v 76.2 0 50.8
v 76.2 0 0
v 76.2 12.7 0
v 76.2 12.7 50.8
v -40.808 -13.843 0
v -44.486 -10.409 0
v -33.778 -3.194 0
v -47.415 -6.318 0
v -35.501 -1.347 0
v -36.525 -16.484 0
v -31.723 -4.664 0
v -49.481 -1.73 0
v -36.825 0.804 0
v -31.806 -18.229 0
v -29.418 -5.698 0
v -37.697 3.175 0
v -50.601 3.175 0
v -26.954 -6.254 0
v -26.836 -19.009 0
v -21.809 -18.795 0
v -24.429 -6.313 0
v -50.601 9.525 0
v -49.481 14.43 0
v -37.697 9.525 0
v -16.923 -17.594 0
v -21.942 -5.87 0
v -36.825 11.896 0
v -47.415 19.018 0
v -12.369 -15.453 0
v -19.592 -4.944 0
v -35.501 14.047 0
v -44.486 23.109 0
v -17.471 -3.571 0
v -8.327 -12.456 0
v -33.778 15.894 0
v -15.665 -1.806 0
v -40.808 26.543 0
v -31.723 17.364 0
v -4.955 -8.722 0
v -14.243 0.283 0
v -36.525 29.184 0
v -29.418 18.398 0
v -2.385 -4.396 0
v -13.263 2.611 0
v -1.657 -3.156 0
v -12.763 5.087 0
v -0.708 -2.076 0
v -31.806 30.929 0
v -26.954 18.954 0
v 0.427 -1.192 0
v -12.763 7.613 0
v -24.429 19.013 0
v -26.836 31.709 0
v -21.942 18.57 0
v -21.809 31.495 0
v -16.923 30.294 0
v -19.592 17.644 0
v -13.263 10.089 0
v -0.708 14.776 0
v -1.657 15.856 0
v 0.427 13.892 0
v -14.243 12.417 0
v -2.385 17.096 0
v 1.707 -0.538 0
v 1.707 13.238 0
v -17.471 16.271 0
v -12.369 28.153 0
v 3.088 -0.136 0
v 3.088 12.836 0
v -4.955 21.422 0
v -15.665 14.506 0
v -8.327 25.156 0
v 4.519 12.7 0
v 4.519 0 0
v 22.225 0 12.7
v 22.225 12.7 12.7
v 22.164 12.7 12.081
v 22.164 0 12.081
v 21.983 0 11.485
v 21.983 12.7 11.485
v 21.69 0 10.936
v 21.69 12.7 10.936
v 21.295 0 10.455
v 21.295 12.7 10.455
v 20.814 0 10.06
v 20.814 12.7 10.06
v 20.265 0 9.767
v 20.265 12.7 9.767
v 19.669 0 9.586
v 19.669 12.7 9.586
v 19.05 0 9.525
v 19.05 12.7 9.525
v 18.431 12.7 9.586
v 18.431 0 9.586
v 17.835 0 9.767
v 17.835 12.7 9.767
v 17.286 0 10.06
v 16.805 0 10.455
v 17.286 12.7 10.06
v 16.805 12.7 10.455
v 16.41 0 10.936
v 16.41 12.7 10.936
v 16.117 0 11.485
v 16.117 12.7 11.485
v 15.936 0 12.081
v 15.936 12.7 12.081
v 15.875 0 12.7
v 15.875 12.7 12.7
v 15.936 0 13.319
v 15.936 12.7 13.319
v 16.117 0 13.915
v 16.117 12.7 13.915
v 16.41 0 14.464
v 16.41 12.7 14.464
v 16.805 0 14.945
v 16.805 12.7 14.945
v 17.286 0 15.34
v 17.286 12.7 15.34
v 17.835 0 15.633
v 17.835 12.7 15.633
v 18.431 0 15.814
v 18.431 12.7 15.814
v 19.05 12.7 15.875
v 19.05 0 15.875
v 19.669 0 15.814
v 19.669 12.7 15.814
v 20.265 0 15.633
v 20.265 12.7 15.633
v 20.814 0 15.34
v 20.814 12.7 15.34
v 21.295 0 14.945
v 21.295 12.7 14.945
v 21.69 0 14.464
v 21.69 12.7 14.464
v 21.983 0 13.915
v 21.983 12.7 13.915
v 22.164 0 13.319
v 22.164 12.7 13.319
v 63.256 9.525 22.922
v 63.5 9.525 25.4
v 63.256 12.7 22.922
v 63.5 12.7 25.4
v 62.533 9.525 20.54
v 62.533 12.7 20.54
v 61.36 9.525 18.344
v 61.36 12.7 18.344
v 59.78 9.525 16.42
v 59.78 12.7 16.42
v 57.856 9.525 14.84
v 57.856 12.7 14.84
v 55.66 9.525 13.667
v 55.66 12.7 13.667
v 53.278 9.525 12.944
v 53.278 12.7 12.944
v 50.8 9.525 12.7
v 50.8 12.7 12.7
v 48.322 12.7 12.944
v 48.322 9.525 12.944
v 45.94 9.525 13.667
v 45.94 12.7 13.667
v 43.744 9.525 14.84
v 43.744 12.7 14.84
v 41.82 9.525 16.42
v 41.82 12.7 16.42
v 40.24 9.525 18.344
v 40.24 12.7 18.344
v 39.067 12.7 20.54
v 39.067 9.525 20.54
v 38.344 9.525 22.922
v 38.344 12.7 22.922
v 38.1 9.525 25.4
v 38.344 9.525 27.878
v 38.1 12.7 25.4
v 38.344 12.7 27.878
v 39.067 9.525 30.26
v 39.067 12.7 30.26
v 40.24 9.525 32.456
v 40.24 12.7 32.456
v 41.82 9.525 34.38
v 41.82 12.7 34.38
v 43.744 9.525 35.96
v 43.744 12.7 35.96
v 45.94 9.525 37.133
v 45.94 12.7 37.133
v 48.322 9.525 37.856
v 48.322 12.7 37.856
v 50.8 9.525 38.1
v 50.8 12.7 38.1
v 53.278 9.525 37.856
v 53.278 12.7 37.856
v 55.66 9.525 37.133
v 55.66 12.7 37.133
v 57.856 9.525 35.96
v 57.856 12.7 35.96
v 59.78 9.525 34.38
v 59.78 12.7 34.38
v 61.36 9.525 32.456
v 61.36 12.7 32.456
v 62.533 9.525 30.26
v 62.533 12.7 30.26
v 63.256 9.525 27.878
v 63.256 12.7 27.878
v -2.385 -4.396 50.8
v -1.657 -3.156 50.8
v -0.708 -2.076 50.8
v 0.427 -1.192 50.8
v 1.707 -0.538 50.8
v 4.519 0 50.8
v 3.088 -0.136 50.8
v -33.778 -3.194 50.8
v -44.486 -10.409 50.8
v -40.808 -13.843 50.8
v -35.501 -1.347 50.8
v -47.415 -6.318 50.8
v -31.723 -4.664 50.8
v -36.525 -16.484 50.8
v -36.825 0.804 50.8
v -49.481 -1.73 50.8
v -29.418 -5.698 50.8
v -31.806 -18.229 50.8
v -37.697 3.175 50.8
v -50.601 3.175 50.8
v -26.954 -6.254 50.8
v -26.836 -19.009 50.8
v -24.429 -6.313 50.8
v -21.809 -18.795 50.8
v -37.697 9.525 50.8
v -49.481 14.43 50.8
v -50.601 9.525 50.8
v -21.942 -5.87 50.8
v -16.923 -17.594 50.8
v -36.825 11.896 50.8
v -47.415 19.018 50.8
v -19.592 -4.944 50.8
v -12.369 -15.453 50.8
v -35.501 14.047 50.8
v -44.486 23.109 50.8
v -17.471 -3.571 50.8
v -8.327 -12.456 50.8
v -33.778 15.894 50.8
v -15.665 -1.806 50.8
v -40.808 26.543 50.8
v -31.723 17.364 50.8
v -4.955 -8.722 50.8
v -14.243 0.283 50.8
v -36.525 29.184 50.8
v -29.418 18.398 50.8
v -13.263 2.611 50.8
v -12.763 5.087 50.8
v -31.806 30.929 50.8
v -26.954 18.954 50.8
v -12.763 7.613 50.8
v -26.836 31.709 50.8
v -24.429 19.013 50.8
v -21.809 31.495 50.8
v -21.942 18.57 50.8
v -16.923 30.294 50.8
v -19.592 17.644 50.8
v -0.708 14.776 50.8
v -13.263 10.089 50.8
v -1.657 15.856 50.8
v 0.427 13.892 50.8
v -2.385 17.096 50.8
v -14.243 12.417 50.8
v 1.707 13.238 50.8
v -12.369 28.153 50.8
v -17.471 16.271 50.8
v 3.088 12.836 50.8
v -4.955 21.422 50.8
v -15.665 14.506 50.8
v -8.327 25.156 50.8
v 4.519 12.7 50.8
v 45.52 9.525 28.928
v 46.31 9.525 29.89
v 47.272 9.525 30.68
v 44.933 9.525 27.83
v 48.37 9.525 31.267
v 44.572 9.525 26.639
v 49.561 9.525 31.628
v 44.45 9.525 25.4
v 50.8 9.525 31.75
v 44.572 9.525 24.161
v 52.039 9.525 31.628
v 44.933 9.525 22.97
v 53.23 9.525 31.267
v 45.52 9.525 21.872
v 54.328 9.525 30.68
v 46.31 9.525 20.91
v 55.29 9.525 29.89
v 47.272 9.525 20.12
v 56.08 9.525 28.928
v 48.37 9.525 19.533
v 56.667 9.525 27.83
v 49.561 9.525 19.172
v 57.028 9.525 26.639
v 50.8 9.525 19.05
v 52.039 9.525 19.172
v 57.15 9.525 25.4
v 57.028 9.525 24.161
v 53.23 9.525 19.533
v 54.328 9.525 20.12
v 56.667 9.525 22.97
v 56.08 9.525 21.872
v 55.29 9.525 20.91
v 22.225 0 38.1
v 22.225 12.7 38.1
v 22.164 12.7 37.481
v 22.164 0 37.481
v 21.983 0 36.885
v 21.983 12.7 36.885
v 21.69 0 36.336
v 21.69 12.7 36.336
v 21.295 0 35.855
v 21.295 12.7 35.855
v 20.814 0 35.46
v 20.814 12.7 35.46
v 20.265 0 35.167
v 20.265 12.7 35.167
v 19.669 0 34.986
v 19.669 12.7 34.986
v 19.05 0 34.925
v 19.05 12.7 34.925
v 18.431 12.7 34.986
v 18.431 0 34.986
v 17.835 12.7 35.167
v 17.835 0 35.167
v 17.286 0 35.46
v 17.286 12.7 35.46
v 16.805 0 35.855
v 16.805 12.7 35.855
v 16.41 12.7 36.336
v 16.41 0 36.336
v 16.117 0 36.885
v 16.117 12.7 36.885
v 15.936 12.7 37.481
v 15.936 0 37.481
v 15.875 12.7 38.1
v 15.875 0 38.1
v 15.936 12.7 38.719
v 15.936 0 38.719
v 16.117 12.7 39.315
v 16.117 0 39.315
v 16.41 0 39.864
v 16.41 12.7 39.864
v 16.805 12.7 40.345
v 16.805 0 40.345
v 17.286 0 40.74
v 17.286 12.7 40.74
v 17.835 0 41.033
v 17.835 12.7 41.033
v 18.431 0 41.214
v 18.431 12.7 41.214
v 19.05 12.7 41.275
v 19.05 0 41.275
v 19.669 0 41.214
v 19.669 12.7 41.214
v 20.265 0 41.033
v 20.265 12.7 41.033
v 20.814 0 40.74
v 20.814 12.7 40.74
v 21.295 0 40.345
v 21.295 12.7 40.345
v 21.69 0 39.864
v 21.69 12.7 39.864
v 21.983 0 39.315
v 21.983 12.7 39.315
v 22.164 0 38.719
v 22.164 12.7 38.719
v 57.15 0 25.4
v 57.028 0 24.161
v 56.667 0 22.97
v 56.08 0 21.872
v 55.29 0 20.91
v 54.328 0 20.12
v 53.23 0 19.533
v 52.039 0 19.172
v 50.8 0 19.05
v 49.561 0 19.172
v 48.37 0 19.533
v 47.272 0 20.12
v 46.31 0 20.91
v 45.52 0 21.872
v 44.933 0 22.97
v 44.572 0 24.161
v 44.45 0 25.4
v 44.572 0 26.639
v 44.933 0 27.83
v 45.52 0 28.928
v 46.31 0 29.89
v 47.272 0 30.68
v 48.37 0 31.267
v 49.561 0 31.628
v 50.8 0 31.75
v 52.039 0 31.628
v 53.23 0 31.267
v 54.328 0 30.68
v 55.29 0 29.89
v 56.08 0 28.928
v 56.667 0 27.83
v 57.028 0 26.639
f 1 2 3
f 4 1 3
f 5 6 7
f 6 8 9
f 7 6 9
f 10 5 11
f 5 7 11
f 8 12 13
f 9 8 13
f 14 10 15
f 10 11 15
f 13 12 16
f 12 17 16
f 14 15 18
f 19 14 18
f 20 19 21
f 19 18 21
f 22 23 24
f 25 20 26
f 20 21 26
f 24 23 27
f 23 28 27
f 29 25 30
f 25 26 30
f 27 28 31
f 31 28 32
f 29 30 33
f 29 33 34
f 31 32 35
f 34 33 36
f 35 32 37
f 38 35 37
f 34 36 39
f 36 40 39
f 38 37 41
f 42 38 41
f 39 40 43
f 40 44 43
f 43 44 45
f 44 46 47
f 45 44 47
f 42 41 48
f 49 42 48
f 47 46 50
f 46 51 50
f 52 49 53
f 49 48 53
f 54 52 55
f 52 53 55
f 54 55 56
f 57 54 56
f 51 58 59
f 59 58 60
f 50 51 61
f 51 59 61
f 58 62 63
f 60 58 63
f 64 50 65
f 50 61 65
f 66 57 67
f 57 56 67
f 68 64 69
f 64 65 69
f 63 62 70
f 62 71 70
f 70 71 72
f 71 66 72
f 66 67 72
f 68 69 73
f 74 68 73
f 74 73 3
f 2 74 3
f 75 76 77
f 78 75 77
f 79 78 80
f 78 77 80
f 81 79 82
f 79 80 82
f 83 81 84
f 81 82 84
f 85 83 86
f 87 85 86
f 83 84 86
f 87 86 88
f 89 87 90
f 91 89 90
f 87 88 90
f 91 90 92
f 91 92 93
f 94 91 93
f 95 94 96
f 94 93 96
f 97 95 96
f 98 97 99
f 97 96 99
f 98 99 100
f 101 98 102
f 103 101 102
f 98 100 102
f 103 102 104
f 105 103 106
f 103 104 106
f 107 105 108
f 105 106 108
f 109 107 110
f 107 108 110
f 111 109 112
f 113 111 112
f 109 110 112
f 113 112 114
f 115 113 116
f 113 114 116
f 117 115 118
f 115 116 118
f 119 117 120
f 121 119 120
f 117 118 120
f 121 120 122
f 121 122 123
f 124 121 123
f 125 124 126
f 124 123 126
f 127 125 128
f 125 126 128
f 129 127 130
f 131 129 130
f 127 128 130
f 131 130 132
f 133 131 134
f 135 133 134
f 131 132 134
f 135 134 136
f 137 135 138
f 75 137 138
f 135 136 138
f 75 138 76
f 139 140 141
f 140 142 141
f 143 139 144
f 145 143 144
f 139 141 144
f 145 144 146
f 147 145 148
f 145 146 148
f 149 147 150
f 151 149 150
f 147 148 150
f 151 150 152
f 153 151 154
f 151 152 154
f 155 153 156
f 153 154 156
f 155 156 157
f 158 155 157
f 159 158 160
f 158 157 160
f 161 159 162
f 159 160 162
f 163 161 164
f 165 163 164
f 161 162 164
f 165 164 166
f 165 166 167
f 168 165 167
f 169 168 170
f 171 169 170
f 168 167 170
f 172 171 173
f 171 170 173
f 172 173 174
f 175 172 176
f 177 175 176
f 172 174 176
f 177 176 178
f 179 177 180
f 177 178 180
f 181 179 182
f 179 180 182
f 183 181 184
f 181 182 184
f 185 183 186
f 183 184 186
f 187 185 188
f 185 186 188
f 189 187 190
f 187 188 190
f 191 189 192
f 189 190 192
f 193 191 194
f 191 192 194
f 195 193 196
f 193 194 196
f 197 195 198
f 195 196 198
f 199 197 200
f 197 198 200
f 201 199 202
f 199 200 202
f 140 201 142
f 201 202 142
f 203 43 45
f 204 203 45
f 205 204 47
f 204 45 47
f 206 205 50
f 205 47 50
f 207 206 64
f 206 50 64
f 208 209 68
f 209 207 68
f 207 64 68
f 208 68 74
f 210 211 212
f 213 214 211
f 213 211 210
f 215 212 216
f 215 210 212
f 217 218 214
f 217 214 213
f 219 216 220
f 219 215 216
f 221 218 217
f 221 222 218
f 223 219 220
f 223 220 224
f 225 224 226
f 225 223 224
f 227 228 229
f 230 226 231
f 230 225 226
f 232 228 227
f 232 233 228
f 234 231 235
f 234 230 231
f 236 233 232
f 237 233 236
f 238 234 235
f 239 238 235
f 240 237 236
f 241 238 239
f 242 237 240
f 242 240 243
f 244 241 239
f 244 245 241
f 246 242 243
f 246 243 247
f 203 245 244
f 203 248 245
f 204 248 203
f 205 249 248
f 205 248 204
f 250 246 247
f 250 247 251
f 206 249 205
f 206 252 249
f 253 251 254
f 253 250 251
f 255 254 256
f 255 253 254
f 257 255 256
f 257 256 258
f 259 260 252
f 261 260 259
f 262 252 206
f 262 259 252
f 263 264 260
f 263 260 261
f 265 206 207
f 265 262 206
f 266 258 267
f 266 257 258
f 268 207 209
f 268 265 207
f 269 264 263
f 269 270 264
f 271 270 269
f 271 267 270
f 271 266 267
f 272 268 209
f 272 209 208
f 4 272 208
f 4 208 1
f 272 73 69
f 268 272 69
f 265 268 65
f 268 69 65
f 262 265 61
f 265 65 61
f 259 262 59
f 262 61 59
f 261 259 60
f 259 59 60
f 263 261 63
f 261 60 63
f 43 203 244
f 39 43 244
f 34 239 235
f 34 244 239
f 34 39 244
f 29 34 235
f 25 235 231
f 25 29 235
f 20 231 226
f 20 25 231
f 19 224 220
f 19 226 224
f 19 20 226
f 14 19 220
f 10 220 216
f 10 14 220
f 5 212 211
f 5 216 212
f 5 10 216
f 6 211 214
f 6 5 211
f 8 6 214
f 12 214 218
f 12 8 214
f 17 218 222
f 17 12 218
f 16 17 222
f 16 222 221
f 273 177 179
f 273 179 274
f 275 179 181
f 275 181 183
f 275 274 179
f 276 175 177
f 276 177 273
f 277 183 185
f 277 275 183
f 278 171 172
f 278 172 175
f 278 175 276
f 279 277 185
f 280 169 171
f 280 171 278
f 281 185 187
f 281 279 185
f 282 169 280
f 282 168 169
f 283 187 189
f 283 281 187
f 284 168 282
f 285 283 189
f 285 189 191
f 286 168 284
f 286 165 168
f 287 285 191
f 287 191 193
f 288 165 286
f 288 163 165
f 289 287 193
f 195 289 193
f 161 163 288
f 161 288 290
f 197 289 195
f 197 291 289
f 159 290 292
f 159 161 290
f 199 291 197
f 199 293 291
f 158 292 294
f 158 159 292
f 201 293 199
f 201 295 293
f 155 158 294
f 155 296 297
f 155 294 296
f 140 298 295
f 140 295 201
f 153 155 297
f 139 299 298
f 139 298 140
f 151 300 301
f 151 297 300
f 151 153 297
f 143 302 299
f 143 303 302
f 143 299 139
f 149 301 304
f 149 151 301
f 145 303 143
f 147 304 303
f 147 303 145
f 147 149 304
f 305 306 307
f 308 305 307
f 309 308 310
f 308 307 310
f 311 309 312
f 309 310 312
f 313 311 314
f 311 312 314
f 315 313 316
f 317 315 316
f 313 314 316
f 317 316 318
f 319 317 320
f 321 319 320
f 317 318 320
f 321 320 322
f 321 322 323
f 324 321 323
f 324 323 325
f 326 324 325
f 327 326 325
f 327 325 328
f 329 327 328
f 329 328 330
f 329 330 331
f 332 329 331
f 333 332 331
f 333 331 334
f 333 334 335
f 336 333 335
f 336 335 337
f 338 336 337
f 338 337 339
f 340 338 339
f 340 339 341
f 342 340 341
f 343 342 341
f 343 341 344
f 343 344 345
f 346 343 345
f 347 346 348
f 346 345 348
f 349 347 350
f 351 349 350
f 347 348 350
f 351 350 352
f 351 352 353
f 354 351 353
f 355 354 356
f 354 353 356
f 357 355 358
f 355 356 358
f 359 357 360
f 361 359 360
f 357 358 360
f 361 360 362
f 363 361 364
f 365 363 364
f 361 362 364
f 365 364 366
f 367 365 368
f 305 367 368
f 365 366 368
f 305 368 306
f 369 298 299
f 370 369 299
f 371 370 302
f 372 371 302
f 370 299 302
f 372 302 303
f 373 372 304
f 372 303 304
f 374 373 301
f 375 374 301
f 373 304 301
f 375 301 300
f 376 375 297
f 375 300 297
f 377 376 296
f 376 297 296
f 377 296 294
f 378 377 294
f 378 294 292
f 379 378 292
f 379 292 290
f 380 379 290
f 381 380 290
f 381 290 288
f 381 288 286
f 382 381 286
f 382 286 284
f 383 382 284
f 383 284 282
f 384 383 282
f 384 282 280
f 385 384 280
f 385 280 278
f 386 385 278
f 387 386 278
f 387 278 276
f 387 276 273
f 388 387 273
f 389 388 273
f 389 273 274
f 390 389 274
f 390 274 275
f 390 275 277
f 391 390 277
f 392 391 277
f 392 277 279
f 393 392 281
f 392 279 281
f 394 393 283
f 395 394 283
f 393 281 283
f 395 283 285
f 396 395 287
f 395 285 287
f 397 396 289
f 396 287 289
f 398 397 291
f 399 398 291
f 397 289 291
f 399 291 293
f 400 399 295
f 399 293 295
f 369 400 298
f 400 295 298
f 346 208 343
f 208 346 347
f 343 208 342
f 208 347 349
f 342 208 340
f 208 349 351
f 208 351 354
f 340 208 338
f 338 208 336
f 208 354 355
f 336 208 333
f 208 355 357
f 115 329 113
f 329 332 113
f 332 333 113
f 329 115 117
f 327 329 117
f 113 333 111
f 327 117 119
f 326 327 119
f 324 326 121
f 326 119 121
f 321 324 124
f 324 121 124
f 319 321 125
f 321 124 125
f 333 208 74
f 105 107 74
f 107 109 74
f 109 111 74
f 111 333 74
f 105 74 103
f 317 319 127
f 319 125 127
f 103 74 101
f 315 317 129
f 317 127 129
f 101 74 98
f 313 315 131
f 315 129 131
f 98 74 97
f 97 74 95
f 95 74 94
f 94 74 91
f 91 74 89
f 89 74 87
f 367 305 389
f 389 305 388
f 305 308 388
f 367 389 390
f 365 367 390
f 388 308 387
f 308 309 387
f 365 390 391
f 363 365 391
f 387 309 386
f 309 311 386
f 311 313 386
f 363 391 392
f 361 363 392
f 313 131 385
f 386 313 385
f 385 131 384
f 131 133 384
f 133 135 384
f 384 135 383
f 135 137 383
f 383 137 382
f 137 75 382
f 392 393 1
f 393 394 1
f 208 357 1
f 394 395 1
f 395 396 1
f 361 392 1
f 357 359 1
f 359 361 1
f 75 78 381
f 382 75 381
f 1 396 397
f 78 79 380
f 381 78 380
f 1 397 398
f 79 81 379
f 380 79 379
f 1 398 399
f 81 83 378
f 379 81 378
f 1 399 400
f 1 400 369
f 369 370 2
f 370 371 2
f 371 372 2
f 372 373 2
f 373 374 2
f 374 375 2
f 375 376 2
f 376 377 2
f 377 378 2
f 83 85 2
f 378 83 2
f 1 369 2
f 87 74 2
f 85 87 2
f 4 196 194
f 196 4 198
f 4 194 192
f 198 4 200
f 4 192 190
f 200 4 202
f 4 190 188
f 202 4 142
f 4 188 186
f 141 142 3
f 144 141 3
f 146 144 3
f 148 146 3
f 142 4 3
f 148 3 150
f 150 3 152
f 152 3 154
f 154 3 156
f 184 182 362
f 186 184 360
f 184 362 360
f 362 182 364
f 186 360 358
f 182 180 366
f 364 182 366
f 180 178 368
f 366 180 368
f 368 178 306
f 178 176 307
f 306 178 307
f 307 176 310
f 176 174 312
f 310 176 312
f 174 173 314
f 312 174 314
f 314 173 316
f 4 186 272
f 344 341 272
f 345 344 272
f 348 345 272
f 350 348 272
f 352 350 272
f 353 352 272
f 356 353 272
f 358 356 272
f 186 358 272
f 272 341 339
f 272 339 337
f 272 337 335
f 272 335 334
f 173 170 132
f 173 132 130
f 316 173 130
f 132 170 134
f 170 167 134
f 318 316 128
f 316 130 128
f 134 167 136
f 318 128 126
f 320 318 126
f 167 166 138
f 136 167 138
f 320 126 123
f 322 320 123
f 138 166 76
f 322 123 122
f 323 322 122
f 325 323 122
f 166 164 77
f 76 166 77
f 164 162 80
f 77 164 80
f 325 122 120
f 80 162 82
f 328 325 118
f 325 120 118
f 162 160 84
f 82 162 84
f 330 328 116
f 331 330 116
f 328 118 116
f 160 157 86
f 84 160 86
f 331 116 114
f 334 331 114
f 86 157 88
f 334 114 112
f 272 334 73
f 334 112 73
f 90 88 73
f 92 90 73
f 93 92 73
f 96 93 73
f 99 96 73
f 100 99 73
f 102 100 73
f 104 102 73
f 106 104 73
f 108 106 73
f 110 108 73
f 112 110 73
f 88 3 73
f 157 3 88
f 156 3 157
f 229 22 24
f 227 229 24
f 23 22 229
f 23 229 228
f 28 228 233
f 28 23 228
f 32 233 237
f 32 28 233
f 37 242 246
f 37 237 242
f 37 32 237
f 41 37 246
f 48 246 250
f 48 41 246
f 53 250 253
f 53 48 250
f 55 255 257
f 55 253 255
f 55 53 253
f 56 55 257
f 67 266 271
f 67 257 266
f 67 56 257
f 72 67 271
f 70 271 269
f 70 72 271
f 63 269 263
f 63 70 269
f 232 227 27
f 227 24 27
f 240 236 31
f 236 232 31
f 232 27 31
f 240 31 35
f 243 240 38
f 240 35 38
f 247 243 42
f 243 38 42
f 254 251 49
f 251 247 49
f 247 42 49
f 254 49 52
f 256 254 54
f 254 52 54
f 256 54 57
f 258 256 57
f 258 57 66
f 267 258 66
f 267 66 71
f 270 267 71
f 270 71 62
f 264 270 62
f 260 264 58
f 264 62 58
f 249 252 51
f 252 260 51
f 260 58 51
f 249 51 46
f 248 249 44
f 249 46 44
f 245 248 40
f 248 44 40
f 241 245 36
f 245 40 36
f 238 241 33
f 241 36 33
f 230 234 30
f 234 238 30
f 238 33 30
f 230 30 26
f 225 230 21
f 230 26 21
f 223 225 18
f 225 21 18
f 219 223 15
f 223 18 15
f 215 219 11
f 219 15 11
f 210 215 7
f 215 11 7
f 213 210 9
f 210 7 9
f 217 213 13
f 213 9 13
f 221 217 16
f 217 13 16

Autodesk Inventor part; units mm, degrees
ref_plane "YZ Plane" through (0, 0, 0) normal (1, 0, 0) x (0, 1, 0)
ref_plane "XZ Plane" through (0, 0, 0) normal (0, 1, 0) x (-1, 0, 0)
ref_plane "XY Plane" through (0, 0, 0) normal (0, 0, 1) x (1, 0, 0)
sketch "Sketch1" plane through (0, 0, 0) normal (0, 0, 1) x (1, 0, 0)
  line L0 (4.5192, 0) -> (76.2, 0)
  line L1 (76.2, 0) -> (76.2, 12.7)
  line L2 (76.2, 12.7) -> (4.5192, 12.7)
  arc A0 (-37.6967, 3.175) -> (-37.6967, 9.525) centre (-25.4, 6.35) ccw
  arc A1 (-2.3852, 17.0962) -> (4.5192, 12.7) centre (4.5192, 20.32) ccw
  arc A2 (4.5192, 0) -> (-2.3852, -4.3962) centre (4.5192, -7.62) ccw
  line L3 (-50.6008, 9.525) -> (-38.1, 9.525)
  line L4 (-50.6008, 3.175) -> (-38.1, 3.175)
  line L5 (-38.1, 9.525) -> (-37.6967, 9.525)
  line L6 (-37.6967, 3.175) -> (-38.1, 3.175)
  arc A3 (-2.3852, 17.0962) -> (-50.6008, 9.525) centre (-25.4, 6.35) ccw
  arc A4 (-50.6008, 3.175) -> (-2.3852, -4.3962) centre (-25.4, 6.35) ccw
  point P0 (0, 0)
  dimension "d0" = 12.7
  dimension "d3" = 25.4
  dimension "d4" = 101.6
  dimension "d5" = 7.62
  dimension "d10" = 25.4
extrude "Extrusion1" add sketch "Sketch1" along normal blind 50.8
sketch "Sketch2" plane through (4.5192, 12.7, 0) normal (0, 1, 0) x (1, 0, 0)
  circle A0 centre (46.2808, -25.4) radius 6.35
  circle A1 centre (14.5308, -12.7) radius 3.175
  circle A2 centre (14.5308, -38.1) radius 3.175
  line L0 (71.6808, 0) -> (71.6808, -50.8) projected
  line L1 (0, 0) -> (71.6808, 0) projected
  line L2 (71.6808, -50.8) -> (0, -50.8) projected
  point P0 (-4.5192, 0)
  dimension "d13" = 12.7
  dimension "d14" = 6.35
  dimension "d15" = 6.35
  dimension "d16" = 25.4
  dimension "d17" = 25.4
  dimension "d18" = 57.15
  dimension "d19" = 12.7
  dimension "d20" = 25.4
  dimension "d21" = 0
extrude "Extrusion2" cut sketch "Sketch2" against normal through all
sketch "Sketch3" plane through (4.5192, 12.7, 0) normal (0, 1, 0) x (1, 0, 0)
  circle A0 centre (46.2808, -25.4) radius 6.35 projected
  circle A1 centre (46.2808, -25.4) radius 12.7
  point P0 (-4.5192, 0)
  dimension "d24" = 25.4
extrude "Extrusion3" cut sketch "Sketch3" against normal blind 3.175
equation "\"d3\" = 2 * d0"
equation "\"d4\" = 8 * d0"
equation "\"d14\" = 0.5 * d13"
equation "\"d15\" = d14"
equation "\"d16\" = d17"
equation "\"d18\" = 2.25 * d16"
equation "\"d19\" = 0.5 * d17"
properties part number "HW 5 Part 4"
